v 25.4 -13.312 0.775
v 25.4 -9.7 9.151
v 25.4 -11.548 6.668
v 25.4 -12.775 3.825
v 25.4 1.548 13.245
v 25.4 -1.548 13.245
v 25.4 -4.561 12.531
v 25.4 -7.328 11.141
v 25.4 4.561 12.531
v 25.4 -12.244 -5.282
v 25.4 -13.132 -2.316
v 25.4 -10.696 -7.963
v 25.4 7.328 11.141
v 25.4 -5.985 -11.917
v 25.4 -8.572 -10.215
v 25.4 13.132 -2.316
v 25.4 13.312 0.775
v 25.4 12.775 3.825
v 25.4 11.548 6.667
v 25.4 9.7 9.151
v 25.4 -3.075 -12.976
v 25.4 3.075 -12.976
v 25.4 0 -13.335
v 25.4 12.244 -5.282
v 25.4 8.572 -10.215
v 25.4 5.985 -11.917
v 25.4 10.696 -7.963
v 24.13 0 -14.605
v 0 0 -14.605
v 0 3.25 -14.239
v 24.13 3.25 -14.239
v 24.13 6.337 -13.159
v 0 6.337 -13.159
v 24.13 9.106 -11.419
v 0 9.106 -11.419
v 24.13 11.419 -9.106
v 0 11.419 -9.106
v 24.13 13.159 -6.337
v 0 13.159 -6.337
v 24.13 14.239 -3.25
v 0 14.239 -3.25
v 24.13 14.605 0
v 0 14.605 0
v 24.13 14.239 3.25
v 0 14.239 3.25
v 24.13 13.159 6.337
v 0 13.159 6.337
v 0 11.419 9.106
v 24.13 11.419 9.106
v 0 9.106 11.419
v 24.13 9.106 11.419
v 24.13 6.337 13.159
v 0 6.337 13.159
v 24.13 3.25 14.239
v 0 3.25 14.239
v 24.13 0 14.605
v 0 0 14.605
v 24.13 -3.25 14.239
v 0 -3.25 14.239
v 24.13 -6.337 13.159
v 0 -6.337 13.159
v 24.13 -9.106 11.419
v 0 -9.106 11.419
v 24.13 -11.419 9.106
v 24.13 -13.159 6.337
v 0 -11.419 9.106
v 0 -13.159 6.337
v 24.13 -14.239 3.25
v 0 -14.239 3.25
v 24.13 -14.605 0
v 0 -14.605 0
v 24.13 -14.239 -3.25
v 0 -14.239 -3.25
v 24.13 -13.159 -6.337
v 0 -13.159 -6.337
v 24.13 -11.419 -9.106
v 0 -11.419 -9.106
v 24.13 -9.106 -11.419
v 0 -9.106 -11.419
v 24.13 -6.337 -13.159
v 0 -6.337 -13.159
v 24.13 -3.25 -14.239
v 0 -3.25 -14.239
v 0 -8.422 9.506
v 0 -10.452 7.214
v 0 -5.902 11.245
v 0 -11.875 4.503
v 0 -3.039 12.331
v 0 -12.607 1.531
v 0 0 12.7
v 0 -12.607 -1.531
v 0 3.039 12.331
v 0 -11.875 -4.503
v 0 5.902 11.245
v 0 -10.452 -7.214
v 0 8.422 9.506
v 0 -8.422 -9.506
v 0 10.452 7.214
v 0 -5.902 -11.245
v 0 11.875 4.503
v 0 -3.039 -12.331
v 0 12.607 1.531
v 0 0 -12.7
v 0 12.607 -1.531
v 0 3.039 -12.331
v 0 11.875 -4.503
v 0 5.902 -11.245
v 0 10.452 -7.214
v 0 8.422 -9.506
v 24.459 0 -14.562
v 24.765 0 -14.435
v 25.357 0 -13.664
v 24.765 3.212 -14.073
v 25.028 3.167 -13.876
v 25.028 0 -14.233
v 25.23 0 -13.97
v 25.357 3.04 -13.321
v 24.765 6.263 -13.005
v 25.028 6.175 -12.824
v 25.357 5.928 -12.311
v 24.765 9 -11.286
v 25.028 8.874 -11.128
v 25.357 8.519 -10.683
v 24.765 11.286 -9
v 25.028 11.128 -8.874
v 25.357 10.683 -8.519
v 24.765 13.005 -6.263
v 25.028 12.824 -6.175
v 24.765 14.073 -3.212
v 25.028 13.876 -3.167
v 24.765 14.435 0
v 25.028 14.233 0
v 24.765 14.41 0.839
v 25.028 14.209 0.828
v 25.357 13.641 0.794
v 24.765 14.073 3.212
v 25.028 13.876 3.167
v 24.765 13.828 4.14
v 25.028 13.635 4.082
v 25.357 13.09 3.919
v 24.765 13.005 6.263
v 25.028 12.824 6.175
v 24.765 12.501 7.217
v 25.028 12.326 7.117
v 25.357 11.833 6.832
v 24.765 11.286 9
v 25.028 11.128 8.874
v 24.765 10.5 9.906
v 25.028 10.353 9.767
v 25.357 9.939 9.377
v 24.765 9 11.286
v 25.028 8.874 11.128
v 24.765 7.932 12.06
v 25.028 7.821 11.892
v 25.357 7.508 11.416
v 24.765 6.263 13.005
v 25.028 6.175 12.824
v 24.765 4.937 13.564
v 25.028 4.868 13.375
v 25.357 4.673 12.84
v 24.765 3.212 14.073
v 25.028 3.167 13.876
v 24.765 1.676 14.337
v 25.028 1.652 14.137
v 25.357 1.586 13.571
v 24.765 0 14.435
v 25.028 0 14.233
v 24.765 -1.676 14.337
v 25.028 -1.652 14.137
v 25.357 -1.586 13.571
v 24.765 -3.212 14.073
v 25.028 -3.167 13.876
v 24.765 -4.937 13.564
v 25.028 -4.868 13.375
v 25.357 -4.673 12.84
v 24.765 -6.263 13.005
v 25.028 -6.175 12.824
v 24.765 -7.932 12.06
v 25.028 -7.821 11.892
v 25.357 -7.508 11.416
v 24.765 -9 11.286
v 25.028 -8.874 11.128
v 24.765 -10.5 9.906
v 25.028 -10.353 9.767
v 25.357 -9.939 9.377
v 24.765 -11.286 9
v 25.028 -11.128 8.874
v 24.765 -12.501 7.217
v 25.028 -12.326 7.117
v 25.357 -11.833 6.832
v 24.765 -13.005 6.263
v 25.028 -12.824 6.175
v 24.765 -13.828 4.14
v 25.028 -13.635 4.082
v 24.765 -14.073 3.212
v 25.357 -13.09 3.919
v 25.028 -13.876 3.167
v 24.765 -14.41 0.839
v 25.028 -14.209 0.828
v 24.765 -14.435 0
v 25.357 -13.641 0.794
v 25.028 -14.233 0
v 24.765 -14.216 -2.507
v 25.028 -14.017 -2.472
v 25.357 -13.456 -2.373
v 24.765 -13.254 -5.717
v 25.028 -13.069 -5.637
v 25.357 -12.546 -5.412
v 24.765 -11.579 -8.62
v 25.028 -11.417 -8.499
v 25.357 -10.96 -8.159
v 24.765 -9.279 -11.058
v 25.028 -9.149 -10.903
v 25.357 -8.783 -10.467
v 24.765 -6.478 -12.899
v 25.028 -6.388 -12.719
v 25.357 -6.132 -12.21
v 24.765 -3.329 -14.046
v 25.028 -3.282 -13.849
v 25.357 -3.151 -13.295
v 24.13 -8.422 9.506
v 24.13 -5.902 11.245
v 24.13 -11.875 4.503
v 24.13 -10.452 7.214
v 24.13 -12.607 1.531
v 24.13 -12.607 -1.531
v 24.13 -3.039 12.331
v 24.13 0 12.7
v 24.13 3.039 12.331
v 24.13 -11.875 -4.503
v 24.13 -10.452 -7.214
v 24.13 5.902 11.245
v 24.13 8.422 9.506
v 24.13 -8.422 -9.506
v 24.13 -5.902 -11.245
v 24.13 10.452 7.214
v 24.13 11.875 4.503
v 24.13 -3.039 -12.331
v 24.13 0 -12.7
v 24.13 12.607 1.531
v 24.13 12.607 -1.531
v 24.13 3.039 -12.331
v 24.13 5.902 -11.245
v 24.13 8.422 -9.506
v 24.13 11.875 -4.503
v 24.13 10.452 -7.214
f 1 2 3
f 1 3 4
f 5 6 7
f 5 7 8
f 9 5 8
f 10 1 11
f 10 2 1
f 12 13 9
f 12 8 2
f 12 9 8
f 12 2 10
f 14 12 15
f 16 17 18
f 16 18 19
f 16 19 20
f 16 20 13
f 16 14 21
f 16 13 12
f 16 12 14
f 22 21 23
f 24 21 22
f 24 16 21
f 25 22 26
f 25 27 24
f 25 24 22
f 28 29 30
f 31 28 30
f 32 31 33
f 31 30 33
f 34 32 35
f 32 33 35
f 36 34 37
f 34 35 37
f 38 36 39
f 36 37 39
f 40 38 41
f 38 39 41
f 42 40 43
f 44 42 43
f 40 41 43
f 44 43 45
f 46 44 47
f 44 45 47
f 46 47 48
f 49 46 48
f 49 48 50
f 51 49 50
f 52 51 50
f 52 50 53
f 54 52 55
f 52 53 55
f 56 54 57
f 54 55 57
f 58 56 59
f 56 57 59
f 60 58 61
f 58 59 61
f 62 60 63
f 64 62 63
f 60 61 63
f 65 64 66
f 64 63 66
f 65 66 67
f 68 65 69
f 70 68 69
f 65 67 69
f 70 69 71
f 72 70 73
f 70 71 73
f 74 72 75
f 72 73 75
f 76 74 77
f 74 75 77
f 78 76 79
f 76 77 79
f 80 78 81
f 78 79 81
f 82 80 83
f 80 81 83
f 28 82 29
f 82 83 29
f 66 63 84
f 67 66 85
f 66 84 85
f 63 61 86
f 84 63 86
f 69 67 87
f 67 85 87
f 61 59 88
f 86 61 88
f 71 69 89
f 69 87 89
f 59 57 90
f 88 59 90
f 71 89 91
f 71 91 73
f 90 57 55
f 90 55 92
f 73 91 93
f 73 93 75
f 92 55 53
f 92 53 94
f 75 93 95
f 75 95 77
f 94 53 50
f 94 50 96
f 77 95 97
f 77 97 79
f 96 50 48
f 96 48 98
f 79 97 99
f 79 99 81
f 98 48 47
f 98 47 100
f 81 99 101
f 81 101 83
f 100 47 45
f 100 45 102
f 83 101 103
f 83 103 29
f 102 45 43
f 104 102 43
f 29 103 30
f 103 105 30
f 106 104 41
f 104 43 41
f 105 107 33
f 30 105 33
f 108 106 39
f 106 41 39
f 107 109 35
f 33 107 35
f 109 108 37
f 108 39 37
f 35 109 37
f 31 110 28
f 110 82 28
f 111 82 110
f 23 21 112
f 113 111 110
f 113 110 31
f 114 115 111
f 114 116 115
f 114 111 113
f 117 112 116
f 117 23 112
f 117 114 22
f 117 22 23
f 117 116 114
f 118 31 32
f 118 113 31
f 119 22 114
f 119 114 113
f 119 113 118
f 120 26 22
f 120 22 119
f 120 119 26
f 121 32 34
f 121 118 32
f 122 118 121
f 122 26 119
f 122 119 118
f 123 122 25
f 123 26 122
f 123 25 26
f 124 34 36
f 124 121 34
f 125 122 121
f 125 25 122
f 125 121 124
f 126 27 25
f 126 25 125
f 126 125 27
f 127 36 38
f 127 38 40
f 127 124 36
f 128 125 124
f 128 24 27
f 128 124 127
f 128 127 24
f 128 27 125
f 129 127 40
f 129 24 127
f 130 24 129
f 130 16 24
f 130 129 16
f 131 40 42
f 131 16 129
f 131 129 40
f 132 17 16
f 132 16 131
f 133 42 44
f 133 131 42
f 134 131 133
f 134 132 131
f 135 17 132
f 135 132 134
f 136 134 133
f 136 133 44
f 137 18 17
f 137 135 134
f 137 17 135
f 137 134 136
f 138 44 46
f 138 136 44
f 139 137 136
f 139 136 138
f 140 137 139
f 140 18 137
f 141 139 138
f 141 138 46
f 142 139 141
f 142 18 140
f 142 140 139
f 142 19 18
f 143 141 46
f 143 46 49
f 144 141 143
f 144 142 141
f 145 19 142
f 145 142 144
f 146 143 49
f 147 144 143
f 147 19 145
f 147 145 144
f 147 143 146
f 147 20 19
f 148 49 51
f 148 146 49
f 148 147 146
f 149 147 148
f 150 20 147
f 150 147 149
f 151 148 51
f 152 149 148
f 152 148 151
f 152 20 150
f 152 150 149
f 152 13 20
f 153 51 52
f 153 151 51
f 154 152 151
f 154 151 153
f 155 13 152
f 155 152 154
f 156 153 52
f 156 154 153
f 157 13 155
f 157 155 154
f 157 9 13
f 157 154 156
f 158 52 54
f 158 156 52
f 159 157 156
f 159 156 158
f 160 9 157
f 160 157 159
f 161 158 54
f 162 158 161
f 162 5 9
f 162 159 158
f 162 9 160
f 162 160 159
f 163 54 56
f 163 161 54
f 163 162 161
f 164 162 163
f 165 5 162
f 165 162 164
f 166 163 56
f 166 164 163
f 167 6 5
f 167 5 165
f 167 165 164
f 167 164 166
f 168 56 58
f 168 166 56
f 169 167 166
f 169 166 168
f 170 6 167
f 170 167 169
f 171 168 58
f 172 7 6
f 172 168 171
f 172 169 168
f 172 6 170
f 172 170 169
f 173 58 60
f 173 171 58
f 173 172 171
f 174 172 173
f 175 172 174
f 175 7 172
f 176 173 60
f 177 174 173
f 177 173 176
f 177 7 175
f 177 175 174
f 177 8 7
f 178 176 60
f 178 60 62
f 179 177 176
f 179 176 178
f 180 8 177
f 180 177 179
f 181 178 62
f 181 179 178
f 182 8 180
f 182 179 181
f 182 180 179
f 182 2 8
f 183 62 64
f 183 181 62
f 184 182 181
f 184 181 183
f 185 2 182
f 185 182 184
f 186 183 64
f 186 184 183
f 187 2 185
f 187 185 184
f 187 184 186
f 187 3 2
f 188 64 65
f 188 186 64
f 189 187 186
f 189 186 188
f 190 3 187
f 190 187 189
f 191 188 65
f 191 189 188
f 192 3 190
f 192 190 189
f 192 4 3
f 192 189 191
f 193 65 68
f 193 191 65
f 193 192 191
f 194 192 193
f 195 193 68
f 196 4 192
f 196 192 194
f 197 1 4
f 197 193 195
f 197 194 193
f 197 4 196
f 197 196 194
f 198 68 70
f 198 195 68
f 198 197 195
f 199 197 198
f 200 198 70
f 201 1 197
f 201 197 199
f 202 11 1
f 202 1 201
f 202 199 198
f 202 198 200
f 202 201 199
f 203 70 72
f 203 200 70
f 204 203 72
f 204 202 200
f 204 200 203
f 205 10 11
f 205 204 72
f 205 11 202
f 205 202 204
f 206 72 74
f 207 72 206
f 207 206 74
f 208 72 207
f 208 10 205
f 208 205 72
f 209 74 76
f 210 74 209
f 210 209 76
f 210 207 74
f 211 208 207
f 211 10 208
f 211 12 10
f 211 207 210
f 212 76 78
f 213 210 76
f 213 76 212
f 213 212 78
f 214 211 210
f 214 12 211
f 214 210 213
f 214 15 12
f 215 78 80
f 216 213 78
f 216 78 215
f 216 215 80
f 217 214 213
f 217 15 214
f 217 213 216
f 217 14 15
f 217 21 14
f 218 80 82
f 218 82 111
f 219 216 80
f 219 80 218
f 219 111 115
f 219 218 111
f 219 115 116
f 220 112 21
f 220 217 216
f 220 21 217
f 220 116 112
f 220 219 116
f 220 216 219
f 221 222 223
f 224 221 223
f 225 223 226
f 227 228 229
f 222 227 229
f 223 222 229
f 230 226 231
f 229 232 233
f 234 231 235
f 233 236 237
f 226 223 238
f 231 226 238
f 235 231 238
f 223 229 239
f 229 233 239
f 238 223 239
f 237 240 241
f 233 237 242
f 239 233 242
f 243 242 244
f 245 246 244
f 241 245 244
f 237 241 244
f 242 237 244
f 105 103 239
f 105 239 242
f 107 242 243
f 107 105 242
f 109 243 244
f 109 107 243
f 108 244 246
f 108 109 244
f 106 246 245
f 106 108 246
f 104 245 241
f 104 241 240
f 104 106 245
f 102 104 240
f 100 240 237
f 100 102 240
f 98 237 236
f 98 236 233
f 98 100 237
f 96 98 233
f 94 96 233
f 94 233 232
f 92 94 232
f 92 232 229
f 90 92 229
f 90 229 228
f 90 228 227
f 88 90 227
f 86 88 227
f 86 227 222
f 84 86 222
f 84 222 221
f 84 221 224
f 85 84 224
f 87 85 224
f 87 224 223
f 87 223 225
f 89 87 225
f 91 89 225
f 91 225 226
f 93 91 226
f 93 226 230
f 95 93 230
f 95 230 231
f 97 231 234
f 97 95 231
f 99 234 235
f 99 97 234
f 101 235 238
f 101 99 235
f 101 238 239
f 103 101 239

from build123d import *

# Parameters (mm, degrees)
SKETCH1_R           = 14.605
SKETCH1_R_2         = 12.7
BOSS_EXTRUDE1_DEPTH = 25.4
FILLET1_R           = 1.27
SKETCH3_R           = 12.7
BOSS_EXTRUDE2_DEPTH = 1.27


with BuildPart() as part:
    # Sketch1 → Boss-Extrude1 (new body)
    with BuildSketch(Plane(origin=(0, 0, 0), x_dir=(0, 0, -1), z_dir=(1, 0, 0))):
        Circle(SKETCH1_R)
        Circle(SKETCH1_R_2, mode=Mode.SUBTRACT)
    extrude(amount=BOSS_EXTRUDE1_DEPTH)

    # Fillet1
    fillet1_edges = [part.edges().sort_by_distance(p)[0] for p in [
        (25.4, 0, 14.605),
    ]]
    fillet(fillet1_edges, radius=FILLET1_R)

    # Sketch3 → Boss-Extrude2 (add)
    with BuildSketch(Plane(origin=(25.4, 0, 0), x_dir=(0, 0, -1), z_dir=(1, 0, 0))):
        Circle(SKETCH3_R)
    extrude(amount=-BOSS_EXTRUDE2_DEPTH)


solid = part.part
